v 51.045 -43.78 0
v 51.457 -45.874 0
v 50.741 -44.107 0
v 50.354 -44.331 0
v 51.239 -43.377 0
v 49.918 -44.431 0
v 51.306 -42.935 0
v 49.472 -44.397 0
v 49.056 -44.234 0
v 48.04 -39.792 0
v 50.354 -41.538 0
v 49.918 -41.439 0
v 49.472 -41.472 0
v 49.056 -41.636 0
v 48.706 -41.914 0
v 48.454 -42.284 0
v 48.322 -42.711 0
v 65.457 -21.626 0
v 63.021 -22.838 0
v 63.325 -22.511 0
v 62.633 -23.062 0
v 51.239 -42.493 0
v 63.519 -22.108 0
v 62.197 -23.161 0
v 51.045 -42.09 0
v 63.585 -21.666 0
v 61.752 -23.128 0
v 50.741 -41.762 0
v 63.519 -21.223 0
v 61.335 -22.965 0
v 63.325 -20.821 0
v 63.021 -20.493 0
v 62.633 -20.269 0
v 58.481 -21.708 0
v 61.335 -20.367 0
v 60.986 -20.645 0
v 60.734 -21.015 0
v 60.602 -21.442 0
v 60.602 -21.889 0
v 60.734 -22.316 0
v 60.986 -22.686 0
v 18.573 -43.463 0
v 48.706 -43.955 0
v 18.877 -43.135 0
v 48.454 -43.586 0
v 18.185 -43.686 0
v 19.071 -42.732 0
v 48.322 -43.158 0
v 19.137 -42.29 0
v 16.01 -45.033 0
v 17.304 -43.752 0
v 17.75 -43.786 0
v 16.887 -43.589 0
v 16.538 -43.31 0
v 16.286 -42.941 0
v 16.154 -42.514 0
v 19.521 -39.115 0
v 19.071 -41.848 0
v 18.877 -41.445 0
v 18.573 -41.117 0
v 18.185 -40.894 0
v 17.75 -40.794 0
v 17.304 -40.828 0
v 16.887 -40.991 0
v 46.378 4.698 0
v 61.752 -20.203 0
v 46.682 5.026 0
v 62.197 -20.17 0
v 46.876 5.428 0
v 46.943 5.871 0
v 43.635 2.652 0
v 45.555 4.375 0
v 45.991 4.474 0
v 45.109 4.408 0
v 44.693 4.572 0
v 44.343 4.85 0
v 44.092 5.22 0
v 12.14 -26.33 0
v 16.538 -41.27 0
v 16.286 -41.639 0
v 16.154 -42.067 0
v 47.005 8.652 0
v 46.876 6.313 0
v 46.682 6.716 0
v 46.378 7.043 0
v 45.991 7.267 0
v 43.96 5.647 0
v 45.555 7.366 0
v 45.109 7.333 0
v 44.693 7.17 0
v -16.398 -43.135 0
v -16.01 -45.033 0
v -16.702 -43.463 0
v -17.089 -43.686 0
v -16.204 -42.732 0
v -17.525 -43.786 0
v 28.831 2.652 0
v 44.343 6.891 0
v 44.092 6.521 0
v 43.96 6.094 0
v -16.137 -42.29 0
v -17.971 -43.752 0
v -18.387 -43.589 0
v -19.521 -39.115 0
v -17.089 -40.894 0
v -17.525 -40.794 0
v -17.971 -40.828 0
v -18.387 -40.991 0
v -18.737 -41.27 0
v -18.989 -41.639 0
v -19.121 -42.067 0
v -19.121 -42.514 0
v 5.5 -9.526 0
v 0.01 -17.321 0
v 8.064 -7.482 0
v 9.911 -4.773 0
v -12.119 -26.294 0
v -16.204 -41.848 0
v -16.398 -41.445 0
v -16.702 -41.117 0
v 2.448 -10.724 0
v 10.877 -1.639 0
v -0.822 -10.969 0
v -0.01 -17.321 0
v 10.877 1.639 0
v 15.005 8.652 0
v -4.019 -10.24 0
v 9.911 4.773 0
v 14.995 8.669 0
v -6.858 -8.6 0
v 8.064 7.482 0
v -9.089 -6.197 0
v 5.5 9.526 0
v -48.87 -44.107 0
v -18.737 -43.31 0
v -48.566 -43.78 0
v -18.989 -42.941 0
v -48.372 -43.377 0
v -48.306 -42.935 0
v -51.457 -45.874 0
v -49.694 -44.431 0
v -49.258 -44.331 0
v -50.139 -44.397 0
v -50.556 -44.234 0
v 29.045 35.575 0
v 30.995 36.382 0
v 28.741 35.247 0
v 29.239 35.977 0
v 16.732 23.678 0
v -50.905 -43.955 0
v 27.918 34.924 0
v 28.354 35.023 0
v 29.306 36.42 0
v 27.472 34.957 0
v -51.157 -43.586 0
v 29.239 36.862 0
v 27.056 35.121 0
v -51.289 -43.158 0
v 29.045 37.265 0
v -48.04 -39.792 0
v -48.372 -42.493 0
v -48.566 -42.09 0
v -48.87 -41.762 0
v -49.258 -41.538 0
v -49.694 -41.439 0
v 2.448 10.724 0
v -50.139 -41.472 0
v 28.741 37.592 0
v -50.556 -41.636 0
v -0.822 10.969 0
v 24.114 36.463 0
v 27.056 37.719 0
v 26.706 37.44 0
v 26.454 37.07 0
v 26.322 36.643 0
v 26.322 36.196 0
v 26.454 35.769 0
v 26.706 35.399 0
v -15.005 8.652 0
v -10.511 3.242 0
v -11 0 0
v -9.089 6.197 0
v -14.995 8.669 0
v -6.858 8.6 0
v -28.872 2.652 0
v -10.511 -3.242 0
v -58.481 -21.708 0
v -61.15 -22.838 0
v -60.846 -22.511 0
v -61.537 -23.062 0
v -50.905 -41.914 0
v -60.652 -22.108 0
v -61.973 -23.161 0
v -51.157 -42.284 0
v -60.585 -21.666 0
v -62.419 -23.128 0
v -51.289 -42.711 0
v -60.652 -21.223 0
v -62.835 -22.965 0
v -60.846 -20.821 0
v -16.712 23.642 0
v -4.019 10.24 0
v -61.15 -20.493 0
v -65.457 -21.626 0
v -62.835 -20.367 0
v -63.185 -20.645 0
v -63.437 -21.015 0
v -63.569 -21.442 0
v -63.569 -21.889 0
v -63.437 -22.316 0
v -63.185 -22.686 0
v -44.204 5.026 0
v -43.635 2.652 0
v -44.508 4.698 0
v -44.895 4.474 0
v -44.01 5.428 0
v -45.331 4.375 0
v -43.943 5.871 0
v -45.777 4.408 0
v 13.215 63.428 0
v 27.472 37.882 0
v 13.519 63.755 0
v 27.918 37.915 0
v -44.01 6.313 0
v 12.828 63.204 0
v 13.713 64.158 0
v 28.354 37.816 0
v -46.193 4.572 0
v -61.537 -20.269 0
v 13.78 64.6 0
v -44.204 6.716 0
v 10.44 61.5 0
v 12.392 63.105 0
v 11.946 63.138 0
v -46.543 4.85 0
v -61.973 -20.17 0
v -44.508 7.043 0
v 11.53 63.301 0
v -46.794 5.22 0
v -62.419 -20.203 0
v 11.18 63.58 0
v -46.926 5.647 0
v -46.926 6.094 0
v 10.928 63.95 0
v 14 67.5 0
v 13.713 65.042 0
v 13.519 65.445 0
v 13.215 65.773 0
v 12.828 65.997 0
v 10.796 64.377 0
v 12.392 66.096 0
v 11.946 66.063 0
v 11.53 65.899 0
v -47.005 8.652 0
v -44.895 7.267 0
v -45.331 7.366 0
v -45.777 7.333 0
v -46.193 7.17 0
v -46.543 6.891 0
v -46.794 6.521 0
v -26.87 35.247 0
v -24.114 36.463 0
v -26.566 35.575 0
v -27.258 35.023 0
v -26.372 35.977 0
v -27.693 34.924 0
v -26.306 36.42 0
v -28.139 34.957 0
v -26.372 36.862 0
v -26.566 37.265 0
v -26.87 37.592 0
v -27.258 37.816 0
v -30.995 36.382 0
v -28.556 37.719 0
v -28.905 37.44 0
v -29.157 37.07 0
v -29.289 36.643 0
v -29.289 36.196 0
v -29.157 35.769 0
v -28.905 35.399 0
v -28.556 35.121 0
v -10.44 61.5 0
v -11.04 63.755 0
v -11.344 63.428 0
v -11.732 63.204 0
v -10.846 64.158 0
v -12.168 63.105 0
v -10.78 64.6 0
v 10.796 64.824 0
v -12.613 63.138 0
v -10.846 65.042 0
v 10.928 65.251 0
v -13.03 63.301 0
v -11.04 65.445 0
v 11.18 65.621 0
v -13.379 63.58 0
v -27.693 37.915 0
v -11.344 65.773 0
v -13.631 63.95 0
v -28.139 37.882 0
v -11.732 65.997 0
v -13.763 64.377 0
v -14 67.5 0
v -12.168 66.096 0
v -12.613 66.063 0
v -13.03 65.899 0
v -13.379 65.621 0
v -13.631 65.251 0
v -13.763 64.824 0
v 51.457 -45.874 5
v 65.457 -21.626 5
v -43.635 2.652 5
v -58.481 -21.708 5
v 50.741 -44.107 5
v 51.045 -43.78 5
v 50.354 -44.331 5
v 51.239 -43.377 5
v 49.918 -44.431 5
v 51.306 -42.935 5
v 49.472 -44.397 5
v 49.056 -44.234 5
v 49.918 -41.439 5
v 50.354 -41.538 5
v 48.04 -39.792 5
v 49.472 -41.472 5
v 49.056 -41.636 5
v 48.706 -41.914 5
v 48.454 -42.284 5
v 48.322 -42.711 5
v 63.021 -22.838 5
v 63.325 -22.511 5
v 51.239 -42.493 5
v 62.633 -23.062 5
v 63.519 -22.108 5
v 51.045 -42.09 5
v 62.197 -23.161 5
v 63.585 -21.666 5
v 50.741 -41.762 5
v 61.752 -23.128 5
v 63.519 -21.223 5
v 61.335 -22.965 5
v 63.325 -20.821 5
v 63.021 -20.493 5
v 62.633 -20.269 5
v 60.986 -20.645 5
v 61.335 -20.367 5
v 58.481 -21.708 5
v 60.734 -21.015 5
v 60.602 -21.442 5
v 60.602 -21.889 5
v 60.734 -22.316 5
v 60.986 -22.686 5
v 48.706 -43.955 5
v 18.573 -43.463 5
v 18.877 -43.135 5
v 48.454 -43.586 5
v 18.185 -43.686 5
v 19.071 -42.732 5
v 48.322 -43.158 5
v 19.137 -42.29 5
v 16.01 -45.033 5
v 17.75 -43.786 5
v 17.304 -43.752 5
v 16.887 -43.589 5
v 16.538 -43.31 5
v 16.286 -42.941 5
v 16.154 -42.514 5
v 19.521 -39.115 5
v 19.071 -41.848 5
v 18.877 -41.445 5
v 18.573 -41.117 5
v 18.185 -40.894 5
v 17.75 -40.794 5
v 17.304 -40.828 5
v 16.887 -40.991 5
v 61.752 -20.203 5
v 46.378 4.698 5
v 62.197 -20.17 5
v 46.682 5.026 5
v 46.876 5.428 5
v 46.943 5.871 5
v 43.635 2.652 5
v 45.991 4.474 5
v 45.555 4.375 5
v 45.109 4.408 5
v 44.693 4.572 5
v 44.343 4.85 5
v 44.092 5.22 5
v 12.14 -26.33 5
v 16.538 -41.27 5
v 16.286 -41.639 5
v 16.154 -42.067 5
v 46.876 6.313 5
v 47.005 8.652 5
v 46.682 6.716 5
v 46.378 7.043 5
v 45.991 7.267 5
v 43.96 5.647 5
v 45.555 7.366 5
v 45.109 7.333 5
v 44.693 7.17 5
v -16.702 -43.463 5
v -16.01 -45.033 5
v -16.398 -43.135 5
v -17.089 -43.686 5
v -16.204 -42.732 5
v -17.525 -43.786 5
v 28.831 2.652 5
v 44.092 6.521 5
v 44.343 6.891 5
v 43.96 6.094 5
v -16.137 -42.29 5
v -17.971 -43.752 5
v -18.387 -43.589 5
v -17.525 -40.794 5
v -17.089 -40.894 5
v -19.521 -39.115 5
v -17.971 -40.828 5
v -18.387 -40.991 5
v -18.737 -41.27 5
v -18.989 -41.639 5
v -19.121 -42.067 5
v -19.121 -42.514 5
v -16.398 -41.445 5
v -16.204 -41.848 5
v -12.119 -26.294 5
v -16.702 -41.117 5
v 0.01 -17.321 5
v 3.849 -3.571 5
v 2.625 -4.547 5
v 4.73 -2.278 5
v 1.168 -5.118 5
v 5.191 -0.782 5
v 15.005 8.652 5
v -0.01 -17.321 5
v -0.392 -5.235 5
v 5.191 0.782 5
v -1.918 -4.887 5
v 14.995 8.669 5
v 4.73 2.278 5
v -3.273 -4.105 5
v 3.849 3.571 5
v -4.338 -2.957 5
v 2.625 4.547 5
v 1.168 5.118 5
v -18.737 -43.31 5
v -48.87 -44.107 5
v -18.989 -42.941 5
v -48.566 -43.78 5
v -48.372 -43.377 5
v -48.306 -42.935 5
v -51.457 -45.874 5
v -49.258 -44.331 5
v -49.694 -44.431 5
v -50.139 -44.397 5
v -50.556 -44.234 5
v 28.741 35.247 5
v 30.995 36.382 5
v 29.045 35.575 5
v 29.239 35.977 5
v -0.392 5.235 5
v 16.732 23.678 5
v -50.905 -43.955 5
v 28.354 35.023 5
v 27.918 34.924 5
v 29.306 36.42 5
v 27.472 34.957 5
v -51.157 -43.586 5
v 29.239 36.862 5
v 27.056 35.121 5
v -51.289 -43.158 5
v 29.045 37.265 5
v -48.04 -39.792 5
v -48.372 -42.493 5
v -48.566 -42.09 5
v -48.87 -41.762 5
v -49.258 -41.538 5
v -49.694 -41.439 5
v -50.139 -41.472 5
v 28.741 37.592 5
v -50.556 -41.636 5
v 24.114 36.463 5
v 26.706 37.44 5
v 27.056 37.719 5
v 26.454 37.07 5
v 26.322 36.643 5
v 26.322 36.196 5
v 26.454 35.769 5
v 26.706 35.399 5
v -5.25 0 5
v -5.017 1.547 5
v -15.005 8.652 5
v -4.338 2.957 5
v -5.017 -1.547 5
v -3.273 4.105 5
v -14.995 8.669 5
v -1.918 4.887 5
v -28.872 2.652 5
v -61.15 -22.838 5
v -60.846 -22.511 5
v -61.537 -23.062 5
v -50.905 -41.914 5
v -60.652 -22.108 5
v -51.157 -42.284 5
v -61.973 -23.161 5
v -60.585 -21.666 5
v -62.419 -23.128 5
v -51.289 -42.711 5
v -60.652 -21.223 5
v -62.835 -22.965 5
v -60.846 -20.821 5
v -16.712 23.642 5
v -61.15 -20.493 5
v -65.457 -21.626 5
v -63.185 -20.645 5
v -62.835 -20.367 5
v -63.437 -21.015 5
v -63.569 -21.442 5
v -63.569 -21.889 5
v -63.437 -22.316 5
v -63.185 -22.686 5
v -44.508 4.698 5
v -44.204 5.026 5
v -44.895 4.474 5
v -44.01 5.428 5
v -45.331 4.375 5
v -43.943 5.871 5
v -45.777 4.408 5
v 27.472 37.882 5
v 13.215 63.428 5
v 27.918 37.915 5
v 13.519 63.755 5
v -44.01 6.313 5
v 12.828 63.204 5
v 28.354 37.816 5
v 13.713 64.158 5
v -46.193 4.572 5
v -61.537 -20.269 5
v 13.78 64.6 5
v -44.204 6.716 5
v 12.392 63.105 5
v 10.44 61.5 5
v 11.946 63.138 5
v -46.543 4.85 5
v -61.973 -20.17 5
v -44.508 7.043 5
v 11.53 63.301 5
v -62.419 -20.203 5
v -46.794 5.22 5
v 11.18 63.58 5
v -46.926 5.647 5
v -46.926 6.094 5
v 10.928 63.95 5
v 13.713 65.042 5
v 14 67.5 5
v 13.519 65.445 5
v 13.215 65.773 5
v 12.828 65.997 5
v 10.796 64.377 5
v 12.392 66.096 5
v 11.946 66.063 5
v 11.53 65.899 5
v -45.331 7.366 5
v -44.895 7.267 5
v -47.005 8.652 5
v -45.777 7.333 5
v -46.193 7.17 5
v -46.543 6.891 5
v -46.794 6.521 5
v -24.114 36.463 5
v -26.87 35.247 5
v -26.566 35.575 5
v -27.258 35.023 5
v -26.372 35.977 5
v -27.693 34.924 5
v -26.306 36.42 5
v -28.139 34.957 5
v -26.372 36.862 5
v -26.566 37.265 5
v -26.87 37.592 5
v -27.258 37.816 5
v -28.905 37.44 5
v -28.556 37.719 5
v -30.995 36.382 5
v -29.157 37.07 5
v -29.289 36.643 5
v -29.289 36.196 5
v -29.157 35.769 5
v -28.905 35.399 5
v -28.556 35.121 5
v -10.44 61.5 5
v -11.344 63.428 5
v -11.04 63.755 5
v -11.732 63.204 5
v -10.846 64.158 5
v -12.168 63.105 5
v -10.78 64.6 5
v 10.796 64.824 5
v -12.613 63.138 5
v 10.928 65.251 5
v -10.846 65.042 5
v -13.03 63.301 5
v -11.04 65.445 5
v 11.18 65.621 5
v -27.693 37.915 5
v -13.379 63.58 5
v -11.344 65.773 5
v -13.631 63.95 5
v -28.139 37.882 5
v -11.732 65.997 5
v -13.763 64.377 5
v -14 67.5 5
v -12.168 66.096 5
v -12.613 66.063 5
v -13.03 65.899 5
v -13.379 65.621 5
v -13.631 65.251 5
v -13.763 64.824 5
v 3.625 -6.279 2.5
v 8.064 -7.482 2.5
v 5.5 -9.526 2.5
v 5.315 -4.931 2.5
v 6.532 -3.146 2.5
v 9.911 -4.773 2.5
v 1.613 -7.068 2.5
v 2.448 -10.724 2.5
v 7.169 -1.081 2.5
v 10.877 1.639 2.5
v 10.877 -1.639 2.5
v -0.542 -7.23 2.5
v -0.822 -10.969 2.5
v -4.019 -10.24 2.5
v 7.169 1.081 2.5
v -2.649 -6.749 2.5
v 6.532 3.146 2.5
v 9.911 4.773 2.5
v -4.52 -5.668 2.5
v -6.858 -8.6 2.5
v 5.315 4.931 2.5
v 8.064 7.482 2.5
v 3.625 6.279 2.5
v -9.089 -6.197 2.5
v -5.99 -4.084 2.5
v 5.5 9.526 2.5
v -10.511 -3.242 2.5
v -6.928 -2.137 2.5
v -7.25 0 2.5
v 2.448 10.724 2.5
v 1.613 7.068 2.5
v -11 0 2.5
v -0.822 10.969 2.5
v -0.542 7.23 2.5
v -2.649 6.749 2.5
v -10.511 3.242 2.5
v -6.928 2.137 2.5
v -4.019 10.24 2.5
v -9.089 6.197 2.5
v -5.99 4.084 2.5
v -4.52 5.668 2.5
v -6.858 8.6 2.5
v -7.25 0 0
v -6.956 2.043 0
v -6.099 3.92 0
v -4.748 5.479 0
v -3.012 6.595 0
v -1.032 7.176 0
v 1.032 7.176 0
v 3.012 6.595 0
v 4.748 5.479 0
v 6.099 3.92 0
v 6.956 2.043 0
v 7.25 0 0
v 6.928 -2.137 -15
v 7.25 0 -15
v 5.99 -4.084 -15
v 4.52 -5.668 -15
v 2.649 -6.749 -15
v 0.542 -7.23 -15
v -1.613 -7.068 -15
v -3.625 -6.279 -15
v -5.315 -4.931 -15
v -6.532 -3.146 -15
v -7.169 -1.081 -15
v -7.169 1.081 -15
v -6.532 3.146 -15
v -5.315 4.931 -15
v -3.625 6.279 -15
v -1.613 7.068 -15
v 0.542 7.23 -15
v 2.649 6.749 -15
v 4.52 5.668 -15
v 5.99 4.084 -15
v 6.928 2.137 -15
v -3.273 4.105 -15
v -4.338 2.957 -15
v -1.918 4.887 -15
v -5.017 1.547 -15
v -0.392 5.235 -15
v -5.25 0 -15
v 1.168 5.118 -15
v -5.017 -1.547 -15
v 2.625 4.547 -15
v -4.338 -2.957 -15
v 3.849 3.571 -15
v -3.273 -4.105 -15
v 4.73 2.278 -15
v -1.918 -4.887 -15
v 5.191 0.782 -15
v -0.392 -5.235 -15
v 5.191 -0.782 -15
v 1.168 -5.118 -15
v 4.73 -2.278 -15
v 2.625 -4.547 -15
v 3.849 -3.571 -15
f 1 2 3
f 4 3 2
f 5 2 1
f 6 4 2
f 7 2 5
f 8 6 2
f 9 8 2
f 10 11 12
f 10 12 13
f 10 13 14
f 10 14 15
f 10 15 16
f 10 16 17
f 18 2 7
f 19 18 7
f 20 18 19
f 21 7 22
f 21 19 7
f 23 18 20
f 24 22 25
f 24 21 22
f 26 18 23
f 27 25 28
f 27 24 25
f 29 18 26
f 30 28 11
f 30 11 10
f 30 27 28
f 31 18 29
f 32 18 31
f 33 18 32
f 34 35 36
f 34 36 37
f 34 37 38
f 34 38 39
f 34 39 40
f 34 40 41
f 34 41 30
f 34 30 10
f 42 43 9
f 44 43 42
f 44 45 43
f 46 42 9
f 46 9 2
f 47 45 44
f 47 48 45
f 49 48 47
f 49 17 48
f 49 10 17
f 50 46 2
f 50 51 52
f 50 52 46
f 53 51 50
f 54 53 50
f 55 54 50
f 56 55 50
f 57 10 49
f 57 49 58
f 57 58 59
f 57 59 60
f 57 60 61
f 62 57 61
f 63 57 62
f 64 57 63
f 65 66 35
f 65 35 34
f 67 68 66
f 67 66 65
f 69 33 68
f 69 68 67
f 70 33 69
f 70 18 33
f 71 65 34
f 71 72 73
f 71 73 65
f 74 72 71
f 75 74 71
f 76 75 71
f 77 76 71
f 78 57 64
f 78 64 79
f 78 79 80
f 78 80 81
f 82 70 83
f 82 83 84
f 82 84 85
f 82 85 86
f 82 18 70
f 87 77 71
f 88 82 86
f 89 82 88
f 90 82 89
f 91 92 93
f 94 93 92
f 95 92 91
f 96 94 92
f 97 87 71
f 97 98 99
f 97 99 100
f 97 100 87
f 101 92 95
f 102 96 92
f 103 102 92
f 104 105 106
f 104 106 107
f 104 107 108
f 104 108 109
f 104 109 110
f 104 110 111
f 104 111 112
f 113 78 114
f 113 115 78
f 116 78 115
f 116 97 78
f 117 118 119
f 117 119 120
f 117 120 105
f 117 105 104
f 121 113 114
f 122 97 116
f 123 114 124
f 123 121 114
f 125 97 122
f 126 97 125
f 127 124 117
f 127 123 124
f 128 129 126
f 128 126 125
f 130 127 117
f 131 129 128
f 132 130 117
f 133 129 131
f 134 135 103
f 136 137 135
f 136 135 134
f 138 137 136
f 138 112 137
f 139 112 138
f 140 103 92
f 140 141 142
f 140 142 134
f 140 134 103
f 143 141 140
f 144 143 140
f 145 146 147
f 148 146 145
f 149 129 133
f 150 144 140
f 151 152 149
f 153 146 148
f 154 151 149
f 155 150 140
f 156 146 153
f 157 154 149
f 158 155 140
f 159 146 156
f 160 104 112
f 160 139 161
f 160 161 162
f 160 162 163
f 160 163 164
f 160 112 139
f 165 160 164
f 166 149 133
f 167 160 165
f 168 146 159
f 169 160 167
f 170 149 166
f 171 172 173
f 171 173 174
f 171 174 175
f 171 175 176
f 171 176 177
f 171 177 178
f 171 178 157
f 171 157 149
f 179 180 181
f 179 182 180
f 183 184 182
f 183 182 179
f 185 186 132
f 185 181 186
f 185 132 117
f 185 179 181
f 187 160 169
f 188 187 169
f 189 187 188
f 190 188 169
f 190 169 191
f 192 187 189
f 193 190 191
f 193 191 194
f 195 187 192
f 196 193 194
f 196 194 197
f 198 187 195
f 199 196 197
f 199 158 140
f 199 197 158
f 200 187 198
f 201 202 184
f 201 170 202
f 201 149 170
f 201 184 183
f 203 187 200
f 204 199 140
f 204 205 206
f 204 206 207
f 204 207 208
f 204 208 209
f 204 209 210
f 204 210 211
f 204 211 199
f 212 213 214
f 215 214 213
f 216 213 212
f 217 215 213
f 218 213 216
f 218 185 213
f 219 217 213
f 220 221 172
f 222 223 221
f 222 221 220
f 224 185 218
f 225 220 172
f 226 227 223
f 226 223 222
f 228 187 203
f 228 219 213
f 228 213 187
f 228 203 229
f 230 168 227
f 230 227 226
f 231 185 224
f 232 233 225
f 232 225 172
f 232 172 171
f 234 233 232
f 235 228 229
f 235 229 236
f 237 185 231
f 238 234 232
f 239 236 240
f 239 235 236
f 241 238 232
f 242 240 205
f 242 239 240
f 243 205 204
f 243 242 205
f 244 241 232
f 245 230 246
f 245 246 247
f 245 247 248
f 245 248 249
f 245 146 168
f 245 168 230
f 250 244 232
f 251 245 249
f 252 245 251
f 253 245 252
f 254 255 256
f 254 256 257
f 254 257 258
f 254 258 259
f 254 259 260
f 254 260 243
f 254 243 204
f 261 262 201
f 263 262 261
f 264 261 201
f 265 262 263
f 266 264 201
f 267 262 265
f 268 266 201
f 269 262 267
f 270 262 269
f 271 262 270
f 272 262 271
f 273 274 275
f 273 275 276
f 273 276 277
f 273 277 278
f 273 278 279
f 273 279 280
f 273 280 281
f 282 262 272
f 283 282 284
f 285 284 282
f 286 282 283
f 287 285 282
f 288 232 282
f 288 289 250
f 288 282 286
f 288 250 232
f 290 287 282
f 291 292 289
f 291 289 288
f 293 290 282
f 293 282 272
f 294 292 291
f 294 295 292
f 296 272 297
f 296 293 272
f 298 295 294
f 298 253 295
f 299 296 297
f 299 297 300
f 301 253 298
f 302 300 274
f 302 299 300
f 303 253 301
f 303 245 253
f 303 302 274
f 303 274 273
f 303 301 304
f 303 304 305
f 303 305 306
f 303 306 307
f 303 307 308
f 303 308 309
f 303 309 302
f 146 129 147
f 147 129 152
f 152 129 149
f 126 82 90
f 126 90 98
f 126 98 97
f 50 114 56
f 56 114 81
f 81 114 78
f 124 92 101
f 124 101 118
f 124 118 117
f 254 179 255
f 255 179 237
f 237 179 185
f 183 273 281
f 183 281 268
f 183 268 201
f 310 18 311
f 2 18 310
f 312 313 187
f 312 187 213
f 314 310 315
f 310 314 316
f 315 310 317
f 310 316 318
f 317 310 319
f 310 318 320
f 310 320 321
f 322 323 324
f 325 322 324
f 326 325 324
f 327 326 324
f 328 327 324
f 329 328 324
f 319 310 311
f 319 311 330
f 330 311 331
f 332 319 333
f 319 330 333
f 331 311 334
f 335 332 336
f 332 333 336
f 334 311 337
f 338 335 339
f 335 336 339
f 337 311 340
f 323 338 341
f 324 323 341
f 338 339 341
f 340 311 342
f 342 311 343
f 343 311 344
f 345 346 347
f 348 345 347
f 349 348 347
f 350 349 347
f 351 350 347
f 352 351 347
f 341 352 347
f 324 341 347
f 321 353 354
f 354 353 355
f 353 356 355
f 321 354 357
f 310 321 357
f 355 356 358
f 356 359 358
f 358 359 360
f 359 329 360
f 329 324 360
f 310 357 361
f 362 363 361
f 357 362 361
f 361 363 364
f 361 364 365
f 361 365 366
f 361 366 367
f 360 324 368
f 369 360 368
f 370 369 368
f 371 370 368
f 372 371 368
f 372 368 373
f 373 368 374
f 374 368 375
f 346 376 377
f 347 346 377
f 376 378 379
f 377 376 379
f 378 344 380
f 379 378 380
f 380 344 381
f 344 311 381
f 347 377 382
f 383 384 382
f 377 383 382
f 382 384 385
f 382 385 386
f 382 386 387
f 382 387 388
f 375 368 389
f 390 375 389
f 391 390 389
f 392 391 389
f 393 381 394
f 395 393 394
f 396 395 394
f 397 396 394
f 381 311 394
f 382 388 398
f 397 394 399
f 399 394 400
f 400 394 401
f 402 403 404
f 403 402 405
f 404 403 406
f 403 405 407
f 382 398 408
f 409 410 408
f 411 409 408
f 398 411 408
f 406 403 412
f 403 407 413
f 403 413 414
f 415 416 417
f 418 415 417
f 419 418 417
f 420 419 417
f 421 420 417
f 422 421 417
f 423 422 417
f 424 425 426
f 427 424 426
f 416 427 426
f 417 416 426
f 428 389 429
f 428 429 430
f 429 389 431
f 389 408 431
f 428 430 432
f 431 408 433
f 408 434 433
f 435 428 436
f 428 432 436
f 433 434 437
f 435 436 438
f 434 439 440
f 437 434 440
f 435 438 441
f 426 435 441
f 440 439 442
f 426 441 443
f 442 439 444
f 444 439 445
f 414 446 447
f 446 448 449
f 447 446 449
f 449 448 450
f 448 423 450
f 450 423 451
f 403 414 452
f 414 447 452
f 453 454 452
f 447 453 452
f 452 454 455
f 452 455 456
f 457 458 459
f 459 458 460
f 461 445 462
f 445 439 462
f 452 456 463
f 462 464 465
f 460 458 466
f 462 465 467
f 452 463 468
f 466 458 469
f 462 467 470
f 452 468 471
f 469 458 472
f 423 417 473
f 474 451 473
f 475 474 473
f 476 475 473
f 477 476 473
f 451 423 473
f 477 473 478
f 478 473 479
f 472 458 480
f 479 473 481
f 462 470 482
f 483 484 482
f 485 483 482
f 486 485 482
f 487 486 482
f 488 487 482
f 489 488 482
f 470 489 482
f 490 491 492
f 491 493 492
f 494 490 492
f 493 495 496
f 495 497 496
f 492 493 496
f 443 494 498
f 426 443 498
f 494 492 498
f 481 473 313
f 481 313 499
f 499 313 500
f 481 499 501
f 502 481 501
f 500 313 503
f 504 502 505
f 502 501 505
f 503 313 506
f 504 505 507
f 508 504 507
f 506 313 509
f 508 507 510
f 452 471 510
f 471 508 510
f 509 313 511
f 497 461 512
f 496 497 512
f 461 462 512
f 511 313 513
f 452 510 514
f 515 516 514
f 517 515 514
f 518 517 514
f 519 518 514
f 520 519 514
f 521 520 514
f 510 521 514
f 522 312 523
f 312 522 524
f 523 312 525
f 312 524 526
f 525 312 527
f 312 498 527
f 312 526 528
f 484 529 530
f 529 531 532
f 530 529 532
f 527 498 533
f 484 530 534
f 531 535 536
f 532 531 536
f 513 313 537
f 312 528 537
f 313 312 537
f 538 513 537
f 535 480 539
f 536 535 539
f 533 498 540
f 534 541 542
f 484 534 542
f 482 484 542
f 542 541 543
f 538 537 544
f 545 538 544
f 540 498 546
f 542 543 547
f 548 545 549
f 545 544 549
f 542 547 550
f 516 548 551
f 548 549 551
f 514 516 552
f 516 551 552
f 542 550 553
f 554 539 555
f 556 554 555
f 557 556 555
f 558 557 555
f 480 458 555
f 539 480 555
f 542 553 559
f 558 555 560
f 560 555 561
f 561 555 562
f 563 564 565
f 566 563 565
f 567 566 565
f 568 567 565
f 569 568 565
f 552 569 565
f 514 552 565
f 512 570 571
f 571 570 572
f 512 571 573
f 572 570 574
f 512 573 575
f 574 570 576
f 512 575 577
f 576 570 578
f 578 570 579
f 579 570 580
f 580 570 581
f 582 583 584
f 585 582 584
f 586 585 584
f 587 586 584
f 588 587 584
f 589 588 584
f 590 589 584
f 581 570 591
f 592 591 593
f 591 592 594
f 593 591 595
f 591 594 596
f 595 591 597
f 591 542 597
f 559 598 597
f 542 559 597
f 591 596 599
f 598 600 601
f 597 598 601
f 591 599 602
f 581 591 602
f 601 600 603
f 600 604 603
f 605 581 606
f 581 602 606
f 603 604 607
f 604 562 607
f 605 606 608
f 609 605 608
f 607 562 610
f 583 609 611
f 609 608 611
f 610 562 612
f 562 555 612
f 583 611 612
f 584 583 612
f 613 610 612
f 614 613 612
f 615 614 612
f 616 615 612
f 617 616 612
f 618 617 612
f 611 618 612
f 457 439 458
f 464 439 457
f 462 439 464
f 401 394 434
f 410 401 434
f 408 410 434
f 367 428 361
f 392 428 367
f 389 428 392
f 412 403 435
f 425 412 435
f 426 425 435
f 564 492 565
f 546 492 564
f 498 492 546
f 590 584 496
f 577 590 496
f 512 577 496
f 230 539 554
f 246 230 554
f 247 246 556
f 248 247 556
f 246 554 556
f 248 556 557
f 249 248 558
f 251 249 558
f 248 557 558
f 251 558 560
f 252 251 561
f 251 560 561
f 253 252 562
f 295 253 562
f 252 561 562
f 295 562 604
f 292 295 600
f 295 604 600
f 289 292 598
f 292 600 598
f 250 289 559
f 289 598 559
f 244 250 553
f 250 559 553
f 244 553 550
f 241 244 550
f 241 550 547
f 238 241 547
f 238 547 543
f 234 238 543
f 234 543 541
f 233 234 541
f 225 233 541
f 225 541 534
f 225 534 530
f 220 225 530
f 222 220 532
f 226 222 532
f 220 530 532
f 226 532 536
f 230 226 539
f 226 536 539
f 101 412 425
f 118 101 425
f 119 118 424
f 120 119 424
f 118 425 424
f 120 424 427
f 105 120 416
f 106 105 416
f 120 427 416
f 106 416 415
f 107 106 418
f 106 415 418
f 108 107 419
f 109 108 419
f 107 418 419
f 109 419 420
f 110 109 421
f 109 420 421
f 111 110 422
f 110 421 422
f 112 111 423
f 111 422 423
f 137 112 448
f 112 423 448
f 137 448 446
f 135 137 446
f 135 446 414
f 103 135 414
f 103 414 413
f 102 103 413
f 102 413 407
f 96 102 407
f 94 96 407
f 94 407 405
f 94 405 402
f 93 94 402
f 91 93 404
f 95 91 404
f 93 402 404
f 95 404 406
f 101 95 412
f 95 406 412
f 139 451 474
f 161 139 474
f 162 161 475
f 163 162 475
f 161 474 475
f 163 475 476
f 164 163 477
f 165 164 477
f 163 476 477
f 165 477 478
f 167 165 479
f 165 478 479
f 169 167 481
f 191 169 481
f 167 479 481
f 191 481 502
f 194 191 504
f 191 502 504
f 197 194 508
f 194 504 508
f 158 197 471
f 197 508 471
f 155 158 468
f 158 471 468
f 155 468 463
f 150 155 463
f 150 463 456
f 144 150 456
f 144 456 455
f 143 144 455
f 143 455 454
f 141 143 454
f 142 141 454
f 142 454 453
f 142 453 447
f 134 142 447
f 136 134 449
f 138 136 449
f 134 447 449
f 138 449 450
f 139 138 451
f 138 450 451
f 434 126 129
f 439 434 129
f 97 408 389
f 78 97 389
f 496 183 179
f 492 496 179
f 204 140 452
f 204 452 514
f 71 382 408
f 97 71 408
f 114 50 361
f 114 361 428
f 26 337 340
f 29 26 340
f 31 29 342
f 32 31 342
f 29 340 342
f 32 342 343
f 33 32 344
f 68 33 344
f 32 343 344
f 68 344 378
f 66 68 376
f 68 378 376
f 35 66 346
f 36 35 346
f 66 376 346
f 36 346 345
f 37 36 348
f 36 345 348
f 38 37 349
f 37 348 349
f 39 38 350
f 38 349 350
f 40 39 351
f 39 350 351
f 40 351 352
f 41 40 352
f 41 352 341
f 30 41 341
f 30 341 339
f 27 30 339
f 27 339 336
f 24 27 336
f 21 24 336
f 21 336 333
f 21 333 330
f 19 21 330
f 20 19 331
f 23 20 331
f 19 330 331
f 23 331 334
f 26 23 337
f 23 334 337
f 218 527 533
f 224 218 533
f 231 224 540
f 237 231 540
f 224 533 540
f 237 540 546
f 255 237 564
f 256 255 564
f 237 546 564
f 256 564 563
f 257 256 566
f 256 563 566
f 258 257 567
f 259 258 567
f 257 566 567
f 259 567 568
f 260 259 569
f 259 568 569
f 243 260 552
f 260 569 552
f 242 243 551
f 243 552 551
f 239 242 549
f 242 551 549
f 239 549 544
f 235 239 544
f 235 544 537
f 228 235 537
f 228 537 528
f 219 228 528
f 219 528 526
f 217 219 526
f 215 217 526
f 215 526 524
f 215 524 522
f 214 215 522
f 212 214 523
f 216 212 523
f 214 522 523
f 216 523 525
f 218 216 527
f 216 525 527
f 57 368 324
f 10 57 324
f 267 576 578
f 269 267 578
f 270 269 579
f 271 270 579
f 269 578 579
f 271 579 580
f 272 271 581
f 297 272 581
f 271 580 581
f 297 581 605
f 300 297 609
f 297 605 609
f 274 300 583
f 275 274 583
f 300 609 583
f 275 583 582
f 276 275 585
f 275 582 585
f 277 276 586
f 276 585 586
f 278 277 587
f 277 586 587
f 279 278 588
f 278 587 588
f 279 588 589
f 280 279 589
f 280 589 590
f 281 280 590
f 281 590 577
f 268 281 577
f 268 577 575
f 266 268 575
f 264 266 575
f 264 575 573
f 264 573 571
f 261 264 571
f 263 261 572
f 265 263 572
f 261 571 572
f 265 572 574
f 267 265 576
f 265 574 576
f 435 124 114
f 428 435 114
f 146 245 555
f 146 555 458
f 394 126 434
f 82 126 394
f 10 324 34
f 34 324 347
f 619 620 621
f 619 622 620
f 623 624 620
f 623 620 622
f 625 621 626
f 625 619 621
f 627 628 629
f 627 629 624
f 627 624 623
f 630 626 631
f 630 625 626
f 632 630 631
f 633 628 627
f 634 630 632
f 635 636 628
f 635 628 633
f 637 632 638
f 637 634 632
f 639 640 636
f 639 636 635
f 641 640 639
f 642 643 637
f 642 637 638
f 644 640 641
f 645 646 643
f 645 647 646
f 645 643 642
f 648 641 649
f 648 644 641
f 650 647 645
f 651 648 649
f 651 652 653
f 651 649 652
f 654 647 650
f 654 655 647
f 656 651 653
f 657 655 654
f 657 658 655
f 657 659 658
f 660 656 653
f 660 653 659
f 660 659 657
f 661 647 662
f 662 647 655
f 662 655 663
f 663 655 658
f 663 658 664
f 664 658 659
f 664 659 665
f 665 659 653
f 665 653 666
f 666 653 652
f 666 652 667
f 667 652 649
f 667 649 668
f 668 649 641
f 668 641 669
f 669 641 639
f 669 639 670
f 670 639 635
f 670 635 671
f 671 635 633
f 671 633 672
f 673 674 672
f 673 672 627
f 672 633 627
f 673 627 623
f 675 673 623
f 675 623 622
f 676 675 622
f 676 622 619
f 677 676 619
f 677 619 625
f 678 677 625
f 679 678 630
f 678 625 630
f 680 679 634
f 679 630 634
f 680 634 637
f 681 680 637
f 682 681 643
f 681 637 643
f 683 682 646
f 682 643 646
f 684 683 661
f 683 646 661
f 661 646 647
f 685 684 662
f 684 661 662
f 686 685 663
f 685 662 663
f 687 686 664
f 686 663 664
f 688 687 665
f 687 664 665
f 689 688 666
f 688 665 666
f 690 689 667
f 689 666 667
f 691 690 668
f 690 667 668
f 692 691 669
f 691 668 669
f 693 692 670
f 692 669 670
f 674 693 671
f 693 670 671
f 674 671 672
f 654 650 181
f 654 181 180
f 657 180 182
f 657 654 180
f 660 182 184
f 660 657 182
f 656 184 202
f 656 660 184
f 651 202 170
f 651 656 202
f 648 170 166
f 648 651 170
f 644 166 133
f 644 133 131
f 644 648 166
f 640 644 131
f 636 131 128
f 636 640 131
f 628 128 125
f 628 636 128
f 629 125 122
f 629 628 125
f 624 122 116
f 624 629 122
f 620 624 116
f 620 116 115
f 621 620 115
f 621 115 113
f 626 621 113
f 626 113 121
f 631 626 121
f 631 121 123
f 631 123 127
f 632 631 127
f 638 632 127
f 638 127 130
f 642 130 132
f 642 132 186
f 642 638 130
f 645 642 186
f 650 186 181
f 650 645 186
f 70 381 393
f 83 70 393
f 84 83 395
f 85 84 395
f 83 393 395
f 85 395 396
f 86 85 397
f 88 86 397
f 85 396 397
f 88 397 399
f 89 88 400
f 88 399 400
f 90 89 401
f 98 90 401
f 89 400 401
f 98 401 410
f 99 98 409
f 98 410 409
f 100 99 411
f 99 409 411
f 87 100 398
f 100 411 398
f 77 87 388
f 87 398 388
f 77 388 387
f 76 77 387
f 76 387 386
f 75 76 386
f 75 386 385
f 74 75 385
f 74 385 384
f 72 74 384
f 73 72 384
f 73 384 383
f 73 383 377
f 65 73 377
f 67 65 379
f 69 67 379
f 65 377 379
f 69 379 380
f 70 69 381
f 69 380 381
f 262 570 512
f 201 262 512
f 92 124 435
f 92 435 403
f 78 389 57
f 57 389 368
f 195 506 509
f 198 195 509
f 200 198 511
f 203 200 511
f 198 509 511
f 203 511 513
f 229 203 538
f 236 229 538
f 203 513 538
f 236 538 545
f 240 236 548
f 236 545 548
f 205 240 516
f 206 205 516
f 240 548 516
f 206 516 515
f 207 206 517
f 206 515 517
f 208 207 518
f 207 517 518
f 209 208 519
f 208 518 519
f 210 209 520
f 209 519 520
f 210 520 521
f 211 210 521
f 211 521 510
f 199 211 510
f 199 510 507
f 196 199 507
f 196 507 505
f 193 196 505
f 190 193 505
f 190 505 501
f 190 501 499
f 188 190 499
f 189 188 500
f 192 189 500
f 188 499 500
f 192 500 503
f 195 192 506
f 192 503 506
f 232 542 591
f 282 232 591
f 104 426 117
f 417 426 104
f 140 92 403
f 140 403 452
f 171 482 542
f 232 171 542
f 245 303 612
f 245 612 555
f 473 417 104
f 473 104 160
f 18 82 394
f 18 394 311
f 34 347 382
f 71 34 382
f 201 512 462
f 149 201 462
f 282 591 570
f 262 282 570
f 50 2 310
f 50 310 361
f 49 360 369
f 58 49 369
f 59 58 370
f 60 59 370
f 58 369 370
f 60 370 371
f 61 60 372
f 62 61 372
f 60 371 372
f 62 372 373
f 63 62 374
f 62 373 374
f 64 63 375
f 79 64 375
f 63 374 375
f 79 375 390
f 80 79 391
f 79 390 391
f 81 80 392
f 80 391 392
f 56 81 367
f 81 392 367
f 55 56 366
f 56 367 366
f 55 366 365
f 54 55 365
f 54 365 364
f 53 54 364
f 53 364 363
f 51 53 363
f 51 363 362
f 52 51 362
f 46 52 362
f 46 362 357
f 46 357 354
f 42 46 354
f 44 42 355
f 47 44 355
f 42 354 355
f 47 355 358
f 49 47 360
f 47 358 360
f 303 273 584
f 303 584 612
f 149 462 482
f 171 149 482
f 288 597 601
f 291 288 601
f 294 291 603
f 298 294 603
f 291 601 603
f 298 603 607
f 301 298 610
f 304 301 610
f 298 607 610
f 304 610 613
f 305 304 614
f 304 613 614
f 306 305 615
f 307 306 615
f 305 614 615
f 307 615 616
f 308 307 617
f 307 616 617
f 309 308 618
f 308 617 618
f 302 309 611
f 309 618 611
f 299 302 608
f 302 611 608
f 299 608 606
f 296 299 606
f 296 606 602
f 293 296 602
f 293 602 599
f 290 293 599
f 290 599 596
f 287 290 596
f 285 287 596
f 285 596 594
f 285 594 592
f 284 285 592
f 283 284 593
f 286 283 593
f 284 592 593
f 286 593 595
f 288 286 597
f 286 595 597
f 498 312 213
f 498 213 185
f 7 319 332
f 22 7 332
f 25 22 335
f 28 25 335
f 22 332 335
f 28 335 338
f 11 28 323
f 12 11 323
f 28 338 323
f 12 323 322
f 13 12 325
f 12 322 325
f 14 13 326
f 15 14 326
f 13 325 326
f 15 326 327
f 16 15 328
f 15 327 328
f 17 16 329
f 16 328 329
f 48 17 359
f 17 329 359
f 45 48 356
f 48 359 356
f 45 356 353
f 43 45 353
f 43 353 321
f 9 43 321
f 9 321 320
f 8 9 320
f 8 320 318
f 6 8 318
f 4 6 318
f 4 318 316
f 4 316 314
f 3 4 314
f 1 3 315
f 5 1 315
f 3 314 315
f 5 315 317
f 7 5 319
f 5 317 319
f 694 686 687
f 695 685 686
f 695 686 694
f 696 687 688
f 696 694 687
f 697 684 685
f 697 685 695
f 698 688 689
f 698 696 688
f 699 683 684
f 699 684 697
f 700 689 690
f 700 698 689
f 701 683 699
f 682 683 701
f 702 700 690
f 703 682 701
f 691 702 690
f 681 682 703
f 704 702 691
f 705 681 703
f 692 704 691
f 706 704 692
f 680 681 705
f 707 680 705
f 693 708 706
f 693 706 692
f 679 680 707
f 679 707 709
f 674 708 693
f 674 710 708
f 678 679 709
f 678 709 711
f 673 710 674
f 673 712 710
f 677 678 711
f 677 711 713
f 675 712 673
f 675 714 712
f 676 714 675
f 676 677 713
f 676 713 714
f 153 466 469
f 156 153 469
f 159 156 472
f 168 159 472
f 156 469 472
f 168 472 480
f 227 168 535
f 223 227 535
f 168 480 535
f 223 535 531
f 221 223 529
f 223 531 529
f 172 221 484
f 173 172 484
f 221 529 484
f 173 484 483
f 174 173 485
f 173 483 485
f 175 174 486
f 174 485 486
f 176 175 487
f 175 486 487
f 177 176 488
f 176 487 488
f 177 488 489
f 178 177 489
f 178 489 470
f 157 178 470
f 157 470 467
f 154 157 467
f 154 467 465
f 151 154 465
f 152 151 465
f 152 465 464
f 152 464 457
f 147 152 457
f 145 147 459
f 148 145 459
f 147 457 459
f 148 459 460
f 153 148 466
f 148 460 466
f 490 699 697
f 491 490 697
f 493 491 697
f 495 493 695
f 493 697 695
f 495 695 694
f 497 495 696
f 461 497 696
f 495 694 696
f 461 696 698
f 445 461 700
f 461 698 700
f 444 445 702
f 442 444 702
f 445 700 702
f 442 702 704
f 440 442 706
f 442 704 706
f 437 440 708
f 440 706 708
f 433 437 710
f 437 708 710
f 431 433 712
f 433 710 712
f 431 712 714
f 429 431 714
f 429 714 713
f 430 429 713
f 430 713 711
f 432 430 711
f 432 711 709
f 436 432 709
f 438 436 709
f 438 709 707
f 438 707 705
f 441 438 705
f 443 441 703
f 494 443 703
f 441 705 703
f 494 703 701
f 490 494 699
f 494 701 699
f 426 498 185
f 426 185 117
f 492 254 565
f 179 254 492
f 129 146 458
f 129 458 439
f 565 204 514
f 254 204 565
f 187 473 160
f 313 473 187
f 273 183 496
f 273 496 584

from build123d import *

# Parameters (mm, degrees)
BOSS_EXTRUDE1_DEPTH = 5
CUT_EXTRUDE1_DEPTH  = 95.158544522
SKETCH6_R           = 7.25
BOSS_EXTRUDE3_DEPTH = 15
SKETCH3_R           = 5.25
CUT_EXTRUDE2_DEPTH  = 20
SKETCH5_R           = 1.5
CUT_EXTRUDE3_DEPTH  = 5
CUT_EXTRUDE4_START  = -2.5
SKETCH8_R           = 11
SKETCH8_R_2         = 7.25
CUT_EXTRUDE4_DEPTH  = 2.5


with BuildPart() as part:
    # Sketch1 → Boss-Extrude1 (new body)
    with BuildSketch(Plane.XY):
        Polygon((-30.995, 36.381727213), (-14, 67.5), (14, 67.5), (30.995, 36.381727213), (14.995, 8.668914292), (15, 8.660254038), (15.005, 8.651593784), (47.005, 8.651593784), (65.456714755, -21.625644347), (51.456714755, -45.874355653), (16.01, -45.033320997), (0.01, -17.320508076), (0, -17.320508076), (-0.01, -17.320508076), (-16.01, -45.033320997), (-51.456714755, -45.874355653), (-65.456714755, -21.625644347), (-47.005, 8.651593784), (-15.005, 8.651593784), (-15, 8.660254038), (-14.995, 8.668914292), align=None)
    extrude(amount=BOSS_EXTRUDE1_DEPTH)

    # Sketch2 → Cut-Extrude1 (cut, through all)
    with BuildSketch(Plane.XY.offset(5)):
        Polygon((-28.872149716, 2.651593784), (-12.118974925, -26.293867874), (-19.521225678, -39.114942267), (-48.040387098, -39.791608731), (-58.480737567, -21.708391269), (-43.63514651, 2.651593784), align=None)
        Polygon((-24.113920832, 36.463348484), (-16.71167008, 23.64227409), (16.732422435, 23.678218224), (24.113920832, 36.463348484), (10.440350469, 61.5), (-10.440350469, 61.5), align=None)
        Polygon((43.63514651, 2.651593784), (28.830645005, 2.651593784), (12.139727281, -26.329812008), (19.521225678, -39.114942267), (48.040387098, -39.791608731), (58.480737567, -21.708391269), align=None)
    extrude(amount=-CUT_EXTRUDE1_DEPTH, mode=Mode.SUBTRACT)

    # Sketch6 → Boss-Extrude3 (add)
    with BuildSketch(Plane(origin=(0, 0, 0), x_dir=(-1, 0, 0), z_dir=(0, 0, -1))):
        with Locations(Location((0, 0, 0), (0, 0, 180))):
            Circle(SKETCH6_R)
    extrude(amount=BOSS_EXTRUDE3_DEPTH)

    # Sketch3 → Cut-Extrude2 (cut)
    with BuildSketch(Plane(origin=(0, 0, -15), x_dir=(-1, 0, 0), z_dir=(0, 0, -1))):
        Circle(SKETCH3_R)
    extrude(amount=-CUT_EXTRUDE2_DEPTH, mode=Mode.SUBTRACT)

    # Sketch5 → Cut-Extrude3 (cut)
    with BuildSketch(Plane.XY.offset(5)):
        with Locations((-45.443044798, 5.870544436)):
            Circle(SKETCH5_R)
        with Locations((-62.08538883, -21.665632507)):
            Circle(SKETCH5_R)
        with Locations((-49.805684066, -42.93470506)):
            Circle(SKETCH5_R)
        with Locations((-17.637483295, -42.290100822)):
            Circle(SKETCH5_R)
        with Locations((27.80556106, 36.419560852)):
            Circle(SKETCH5_R)
        with Locations((12.279704321, 64.600342034)):
            Circle(SKETCH5_R)
        with Locations((-12.279705207, 64.600342034)):
            Circle(SKETCH5_R)
        with Locations((-27.805561947, 36.419560852)):
            Circle(SKETCH5_R)
        with Locations((17.637482409, -42.290100822)):
            Circle(SKETCH5_R)
        with Locations((49.80568318, -42.93470506)):
            Circle(SKETCH5_R)
        with Locations((62.085387944, -21.665632507)):
            Circle(SKETCH5_R)
        with Locations((45.443043912, 5.870544436)):
            Circle(SKETCH5_R)
    extrude(amount=-CUT_EXTRUDE3_DEPTH, mode=Mode.SUBTRACT)

    # Sketch8 → Cut-Extrude4 (cut)
    with BuildSketch(Plane(origin=(0, 0, 0), x_dir=(-1, 0, 0), z_dir=(0, 0, -1)).offset(CUT_EXTRUDE4_START)):
        Circle(SKETCH8_R)
        Circle(SKETCH8_R_2, mode=Mode.SUBTRACT)
    extrude(amount=CUT_EXTRUDE4_DEPTH, mode=Mode.SUBTRACT)


solid = part.part
